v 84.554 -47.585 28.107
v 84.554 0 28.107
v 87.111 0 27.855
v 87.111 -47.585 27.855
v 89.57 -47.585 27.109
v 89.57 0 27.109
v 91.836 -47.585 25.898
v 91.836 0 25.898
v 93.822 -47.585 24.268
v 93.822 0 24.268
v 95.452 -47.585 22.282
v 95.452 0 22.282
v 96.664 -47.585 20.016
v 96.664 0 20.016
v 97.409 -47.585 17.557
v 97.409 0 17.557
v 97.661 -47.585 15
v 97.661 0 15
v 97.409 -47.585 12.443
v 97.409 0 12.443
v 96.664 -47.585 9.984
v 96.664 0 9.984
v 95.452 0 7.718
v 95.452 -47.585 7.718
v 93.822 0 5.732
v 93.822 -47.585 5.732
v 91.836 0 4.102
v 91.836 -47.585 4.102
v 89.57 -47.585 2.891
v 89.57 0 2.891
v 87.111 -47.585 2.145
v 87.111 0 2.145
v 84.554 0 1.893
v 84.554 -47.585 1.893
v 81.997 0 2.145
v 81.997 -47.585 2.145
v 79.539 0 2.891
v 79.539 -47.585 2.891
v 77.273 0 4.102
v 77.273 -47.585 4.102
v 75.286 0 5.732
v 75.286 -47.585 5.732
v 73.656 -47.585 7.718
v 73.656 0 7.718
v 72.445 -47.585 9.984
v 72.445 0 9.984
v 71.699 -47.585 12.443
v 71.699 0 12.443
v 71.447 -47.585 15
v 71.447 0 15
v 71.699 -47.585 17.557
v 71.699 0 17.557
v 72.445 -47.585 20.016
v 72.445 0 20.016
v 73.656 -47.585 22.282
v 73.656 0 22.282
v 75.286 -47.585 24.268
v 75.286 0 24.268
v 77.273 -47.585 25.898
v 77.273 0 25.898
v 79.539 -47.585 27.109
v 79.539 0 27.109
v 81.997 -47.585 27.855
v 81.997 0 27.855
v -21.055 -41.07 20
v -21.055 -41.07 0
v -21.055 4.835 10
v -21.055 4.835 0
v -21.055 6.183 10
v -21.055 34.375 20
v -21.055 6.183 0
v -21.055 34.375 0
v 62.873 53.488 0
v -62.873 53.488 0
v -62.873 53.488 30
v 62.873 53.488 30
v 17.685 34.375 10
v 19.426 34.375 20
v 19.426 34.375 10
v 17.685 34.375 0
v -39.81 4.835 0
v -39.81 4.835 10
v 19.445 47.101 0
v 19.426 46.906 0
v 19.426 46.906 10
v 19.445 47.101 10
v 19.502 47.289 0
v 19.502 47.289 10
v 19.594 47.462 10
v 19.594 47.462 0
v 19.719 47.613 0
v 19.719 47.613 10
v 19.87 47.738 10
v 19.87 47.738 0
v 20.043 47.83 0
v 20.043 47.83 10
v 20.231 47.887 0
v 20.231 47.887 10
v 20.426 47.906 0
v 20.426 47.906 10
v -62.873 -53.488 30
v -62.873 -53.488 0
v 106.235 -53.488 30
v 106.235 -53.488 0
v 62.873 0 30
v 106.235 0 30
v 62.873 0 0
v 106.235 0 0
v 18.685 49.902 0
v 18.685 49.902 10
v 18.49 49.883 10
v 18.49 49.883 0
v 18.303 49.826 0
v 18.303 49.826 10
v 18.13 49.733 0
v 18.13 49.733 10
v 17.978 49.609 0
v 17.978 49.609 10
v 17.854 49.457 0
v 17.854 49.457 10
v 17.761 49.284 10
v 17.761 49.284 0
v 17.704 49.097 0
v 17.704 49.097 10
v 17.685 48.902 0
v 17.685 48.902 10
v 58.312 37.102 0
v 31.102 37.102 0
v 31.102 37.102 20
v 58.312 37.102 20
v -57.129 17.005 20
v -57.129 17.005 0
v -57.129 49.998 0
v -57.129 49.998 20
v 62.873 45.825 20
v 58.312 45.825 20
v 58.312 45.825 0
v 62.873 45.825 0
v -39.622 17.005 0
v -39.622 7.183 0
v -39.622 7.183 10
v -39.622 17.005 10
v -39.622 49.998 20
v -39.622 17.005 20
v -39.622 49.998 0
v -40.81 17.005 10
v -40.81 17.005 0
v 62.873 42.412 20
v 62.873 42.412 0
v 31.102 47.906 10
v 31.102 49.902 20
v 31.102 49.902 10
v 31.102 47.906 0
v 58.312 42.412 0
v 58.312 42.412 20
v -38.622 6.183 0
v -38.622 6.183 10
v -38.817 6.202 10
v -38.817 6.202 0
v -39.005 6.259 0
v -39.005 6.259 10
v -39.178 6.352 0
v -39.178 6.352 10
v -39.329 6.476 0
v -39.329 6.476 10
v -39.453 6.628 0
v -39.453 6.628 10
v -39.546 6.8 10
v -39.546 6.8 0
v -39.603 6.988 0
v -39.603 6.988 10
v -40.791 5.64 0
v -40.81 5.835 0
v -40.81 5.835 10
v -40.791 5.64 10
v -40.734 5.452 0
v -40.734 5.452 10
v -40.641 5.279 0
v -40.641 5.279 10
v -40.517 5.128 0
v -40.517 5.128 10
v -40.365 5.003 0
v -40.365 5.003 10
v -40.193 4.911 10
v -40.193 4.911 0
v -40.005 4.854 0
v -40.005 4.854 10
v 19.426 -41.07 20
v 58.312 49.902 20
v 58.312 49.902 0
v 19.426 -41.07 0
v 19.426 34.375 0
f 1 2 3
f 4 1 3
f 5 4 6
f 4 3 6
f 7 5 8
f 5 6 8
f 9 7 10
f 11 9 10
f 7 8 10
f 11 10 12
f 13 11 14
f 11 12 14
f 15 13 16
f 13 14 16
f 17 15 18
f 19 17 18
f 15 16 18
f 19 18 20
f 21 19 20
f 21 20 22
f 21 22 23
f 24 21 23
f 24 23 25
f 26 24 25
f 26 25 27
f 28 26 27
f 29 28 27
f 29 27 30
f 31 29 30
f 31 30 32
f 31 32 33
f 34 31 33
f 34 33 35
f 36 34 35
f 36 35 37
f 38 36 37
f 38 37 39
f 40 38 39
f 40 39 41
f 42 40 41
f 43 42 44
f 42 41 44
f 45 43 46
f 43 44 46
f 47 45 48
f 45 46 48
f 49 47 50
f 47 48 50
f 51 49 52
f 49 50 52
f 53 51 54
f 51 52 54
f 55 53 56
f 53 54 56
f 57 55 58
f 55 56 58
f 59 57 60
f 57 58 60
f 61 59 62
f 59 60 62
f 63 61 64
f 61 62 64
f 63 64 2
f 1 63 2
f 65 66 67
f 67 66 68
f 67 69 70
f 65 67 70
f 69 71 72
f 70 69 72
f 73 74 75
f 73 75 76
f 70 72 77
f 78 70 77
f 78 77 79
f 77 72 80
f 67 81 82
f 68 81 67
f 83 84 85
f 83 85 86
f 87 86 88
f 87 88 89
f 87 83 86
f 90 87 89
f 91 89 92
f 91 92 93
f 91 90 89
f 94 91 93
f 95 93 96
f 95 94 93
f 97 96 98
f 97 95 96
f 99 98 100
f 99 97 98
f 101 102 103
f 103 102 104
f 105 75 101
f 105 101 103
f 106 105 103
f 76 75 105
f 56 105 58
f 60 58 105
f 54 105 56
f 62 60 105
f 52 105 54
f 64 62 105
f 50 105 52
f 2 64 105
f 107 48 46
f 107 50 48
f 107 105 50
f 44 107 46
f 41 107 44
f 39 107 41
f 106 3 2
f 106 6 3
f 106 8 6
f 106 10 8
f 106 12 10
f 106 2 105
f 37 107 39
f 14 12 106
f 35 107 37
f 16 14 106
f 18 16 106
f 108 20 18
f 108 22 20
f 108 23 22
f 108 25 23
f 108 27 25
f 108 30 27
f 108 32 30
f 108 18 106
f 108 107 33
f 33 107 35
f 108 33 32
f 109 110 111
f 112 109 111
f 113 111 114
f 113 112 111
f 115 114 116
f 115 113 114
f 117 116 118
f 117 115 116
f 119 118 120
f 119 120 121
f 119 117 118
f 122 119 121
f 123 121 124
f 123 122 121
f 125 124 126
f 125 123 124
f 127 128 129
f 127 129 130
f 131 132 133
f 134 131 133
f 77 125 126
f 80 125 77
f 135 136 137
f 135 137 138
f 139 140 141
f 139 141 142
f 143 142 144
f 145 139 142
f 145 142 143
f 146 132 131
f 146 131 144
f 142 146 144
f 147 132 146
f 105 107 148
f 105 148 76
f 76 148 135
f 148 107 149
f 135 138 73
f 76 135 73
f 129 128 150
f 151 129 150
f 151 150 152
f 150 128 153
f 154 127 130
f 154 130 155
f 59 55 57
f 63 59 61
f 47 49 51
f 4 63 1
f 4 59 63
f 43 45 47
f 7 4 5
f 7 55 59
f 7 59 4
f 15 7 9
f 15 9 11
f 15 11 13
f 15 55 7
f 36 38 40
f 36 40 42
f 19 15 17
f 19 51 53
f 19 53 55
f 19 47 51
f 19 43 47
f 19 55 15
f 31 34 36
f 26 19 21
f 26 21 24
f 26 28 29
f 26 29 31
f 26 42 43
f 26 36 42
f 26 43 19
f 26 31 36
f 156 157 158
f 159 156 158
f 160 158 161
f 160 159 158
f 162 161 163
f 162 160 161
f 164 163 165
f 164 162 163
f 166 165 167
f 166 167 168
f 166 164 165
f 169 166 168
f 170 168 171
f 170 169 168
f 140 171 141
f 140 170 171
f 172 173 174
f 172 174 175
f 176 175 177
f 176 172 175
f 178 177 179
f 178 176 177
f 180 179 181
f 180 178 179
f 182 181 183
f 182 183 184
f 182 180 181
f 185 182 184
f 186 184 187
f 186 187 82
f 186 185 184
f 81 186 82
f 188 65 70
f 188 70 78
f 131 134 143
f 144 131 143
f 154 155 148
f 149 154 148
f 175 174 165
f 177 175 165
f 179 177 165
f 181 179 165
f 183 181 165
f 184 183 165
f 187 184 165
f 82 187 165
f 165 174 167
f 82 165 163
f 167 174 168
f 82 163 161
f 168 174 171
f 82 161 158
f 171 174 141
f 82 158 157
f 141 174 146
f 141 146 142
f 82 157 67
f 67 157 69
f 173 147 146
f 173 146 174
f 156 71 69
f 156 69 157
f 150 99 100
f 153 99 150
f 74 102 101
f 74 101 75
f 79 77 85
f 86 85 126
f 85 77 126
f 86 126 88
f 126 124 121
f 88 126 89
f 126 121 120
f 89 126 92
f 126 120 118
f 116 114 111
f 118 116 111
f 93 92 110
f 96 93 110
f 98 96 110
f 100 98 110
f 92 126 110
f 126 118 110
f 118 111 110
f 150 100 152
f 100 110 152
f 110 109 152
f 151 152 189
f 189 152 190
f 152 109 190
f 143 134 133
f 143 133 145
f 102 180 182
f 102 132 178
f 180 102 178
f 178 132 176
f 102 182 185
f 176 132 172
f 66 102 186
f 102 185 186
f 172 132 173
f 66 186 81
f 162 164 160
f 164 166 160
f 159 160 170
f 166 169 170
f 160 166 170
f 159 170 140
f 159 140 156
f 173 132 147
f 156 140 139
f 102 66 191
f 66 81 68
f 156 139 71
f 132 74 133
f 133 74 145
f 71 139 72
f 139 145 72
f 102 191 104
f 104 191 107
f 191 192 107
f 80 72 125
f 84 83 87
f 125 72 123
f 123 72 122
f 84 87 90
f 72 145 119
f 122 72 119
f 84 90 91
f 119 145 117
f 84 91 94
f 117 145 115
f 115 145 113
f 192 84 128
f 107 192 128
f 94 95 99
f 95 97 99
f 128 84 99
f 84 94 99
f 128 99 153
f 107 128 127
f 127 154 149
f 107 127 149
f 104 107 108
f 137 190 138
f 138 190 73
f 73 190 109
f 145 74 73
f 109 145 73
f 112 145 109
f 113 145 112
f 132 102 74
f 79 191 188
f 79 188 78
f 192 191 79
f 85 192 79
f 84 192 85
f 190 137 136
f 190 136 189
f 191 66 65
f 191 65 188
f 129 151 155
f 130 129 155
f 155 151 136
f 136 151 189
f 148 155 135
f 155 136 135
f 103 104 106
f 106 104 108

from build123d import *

# Parameters (mm, degrees)
SKETCH_1_W          = 125.74675372
SKETCH_1_H          = 106.976622422
EXTRUDE_3_DEPTH     = 30
SKETCH_3_W          = 40.480715441
SKETCH_3_H          = 75.445810288
CUT_EXTRUDE_2_DEPTH = 20
SKETCH_6_W          = 4.561176424
SKETCH_6_H          = 3.413136976
SKETCH_6_W_2        = 27.210286446
SKETCH_6_H_2        = 12.79926366
SKETCH_6_W_3        = 17.507485433
SKETCH_6_H_3        = 32.993657433
CUT_EXTRUDE_6_DEPTH = 20
CUT_EXTRUDE_7_DEPTH = 10
SKETCH_8_W          = 43.362055896
SKETCH_8_H          = 5.90330429
EXTRUDE_4_DEPTH     = 30
SKETCH_9_W          = 43.362055896
SKETCH_9_H          = 30
SKETCH_9_R          = 13.106917469
EXTRUDE_5_DEPTH     = 50


with BuildPart() as part:
    # 草图1 → 凸台-拉伸3 (new body)
    with BuildSketch(Plane.XY):
        Rectangle(SKETCH_1_W, SKETCH_1_H)
    extrude(amount=EXTRUDE_3_DEPTH)

    # 草图3 → 切除-拉伸2 (cut)
    with BuildSketch(Plane.XY):
        with Locations((-0.814646552, -3.347576181)):
            Rectangle(SKETCH_3_W, SKETCH_3_H)
    extrude(amount=CUT_EXTRUDE_2_DEPTH, mode=Mode.SUBTRACT)

    # 草图6 → 切除-拉伸6 (cut)
    with BuildSketch(Plane.XY):
        with Locations((60.592788648, 44.118378059)):
            Rectangle(SKETCH_6_W, SKETCH_6_H)
        with Locations((44.707057213, 43.502117216)):
            Rectangle(SKETCH_6_W_2, SKETCH_6_H_2)
        with Locations((-48.375754904, 33.501377131)):
            Rectangle(SKETCH_6_W_3, SKETCH_6_H_3)
    extrude(amount=CUT_EXTRUDE_6_DEPTH, mode=Mode.SUBTRACT)

    # 草图7 → 切除-拉伸7 (cut)
    with BuildSketch(Plane.XY):
        with BuildLine():
            Line((31.10191399, 49.901749046), (19.425711168, 49.901749046))
            Line((19.425711168, 49.901749046), (18.685275266, 49.901749046))
            ThreePointArc((18.685275266, 49.901749046), (17.978168485, 49.608855827), (17.685275266, 48.901749046))
            Line((17.685275266, 48.901749046), (17.685275266, 34.375328963))
            Line((17.685275266, 34.375328963), (19.425711168, 34.375328963))
            Line((19.425711168, 34.375328963), (19.425711168, 46.90603785))
            ThreePointArc((19.425711168, 46.90603785), (19.718604387, 47.613144632), (20.425711168, 47.90603785))
            Line((20.425711168, 47.90603785), (31.10191399, 47.90603785))
            Line((31.10191399, 47.90603785), (31.10191399, 49.901749046))
        make_face()
        with BuildLine():
            Line((-39.622012187, 17.004548414), (-40.809816648, 17.004548414))
            Line((-40.809816648, 17.004548414), (-40.809816648, 6.183104922))
            Line((-40.809816648, 6.183104922), (-40.809816648, 5.834646341))
            ThreePointArc((-40.809816648, 5.834646341), (-40.516923429, 5.12753956), (-39.809816648, 4.834646341))
            Line((-39.809816648, 4.834646341), (-21.055004273, 4.834646341))
            Line((-21.055004273, 4.834646341), (-21.055004273, 6.183104922))
            Line((-21.055004273, 6.183104922), (-38.622012187, 6.183104922))
            ThreePointArc((-38.622012187, 6.183104922), (-39.329118968, 6.475998141), (-39.622012187, 7.183104922))
            Line((-39.622012187, 7.183104922), (-39.622012187, 17.004548414))
        make_face()
    extrude(amount=CUT_EXTRUDE_7_DEPTH, mode=Mode.SUBTRACT)

    # 草图8 → 凸台-拉伸4 (add)
    with BuildSketch(Plane.XY):
        with Locations((84.554404808, -50.536659066)):
            Rectangle(SKETCH_8_W, SKETCH_8_H)
    extrude(amount=EXTRUDE_4_DEPTH)

    # 草图9 → 凸台-拉伸5 (add)
    with BuildSketch(Plane(origin=(0, 0, 0), x_dir=(1, 0, 0), z_dir=(0, 1, 0))):
        with Locations((84.554404808, -15)):
            Rectangle(SKETCH_9_W, SKETCH_9_H)
        with Locations(Location((84.554404808, -15, 0), (0, 0, 270))):
            Circle(SKETCH_9_R, mode=Mode.SUBTRACT)
    extrude(amount=-EXTRUDE_5_DEPTH)


solid = part.part
